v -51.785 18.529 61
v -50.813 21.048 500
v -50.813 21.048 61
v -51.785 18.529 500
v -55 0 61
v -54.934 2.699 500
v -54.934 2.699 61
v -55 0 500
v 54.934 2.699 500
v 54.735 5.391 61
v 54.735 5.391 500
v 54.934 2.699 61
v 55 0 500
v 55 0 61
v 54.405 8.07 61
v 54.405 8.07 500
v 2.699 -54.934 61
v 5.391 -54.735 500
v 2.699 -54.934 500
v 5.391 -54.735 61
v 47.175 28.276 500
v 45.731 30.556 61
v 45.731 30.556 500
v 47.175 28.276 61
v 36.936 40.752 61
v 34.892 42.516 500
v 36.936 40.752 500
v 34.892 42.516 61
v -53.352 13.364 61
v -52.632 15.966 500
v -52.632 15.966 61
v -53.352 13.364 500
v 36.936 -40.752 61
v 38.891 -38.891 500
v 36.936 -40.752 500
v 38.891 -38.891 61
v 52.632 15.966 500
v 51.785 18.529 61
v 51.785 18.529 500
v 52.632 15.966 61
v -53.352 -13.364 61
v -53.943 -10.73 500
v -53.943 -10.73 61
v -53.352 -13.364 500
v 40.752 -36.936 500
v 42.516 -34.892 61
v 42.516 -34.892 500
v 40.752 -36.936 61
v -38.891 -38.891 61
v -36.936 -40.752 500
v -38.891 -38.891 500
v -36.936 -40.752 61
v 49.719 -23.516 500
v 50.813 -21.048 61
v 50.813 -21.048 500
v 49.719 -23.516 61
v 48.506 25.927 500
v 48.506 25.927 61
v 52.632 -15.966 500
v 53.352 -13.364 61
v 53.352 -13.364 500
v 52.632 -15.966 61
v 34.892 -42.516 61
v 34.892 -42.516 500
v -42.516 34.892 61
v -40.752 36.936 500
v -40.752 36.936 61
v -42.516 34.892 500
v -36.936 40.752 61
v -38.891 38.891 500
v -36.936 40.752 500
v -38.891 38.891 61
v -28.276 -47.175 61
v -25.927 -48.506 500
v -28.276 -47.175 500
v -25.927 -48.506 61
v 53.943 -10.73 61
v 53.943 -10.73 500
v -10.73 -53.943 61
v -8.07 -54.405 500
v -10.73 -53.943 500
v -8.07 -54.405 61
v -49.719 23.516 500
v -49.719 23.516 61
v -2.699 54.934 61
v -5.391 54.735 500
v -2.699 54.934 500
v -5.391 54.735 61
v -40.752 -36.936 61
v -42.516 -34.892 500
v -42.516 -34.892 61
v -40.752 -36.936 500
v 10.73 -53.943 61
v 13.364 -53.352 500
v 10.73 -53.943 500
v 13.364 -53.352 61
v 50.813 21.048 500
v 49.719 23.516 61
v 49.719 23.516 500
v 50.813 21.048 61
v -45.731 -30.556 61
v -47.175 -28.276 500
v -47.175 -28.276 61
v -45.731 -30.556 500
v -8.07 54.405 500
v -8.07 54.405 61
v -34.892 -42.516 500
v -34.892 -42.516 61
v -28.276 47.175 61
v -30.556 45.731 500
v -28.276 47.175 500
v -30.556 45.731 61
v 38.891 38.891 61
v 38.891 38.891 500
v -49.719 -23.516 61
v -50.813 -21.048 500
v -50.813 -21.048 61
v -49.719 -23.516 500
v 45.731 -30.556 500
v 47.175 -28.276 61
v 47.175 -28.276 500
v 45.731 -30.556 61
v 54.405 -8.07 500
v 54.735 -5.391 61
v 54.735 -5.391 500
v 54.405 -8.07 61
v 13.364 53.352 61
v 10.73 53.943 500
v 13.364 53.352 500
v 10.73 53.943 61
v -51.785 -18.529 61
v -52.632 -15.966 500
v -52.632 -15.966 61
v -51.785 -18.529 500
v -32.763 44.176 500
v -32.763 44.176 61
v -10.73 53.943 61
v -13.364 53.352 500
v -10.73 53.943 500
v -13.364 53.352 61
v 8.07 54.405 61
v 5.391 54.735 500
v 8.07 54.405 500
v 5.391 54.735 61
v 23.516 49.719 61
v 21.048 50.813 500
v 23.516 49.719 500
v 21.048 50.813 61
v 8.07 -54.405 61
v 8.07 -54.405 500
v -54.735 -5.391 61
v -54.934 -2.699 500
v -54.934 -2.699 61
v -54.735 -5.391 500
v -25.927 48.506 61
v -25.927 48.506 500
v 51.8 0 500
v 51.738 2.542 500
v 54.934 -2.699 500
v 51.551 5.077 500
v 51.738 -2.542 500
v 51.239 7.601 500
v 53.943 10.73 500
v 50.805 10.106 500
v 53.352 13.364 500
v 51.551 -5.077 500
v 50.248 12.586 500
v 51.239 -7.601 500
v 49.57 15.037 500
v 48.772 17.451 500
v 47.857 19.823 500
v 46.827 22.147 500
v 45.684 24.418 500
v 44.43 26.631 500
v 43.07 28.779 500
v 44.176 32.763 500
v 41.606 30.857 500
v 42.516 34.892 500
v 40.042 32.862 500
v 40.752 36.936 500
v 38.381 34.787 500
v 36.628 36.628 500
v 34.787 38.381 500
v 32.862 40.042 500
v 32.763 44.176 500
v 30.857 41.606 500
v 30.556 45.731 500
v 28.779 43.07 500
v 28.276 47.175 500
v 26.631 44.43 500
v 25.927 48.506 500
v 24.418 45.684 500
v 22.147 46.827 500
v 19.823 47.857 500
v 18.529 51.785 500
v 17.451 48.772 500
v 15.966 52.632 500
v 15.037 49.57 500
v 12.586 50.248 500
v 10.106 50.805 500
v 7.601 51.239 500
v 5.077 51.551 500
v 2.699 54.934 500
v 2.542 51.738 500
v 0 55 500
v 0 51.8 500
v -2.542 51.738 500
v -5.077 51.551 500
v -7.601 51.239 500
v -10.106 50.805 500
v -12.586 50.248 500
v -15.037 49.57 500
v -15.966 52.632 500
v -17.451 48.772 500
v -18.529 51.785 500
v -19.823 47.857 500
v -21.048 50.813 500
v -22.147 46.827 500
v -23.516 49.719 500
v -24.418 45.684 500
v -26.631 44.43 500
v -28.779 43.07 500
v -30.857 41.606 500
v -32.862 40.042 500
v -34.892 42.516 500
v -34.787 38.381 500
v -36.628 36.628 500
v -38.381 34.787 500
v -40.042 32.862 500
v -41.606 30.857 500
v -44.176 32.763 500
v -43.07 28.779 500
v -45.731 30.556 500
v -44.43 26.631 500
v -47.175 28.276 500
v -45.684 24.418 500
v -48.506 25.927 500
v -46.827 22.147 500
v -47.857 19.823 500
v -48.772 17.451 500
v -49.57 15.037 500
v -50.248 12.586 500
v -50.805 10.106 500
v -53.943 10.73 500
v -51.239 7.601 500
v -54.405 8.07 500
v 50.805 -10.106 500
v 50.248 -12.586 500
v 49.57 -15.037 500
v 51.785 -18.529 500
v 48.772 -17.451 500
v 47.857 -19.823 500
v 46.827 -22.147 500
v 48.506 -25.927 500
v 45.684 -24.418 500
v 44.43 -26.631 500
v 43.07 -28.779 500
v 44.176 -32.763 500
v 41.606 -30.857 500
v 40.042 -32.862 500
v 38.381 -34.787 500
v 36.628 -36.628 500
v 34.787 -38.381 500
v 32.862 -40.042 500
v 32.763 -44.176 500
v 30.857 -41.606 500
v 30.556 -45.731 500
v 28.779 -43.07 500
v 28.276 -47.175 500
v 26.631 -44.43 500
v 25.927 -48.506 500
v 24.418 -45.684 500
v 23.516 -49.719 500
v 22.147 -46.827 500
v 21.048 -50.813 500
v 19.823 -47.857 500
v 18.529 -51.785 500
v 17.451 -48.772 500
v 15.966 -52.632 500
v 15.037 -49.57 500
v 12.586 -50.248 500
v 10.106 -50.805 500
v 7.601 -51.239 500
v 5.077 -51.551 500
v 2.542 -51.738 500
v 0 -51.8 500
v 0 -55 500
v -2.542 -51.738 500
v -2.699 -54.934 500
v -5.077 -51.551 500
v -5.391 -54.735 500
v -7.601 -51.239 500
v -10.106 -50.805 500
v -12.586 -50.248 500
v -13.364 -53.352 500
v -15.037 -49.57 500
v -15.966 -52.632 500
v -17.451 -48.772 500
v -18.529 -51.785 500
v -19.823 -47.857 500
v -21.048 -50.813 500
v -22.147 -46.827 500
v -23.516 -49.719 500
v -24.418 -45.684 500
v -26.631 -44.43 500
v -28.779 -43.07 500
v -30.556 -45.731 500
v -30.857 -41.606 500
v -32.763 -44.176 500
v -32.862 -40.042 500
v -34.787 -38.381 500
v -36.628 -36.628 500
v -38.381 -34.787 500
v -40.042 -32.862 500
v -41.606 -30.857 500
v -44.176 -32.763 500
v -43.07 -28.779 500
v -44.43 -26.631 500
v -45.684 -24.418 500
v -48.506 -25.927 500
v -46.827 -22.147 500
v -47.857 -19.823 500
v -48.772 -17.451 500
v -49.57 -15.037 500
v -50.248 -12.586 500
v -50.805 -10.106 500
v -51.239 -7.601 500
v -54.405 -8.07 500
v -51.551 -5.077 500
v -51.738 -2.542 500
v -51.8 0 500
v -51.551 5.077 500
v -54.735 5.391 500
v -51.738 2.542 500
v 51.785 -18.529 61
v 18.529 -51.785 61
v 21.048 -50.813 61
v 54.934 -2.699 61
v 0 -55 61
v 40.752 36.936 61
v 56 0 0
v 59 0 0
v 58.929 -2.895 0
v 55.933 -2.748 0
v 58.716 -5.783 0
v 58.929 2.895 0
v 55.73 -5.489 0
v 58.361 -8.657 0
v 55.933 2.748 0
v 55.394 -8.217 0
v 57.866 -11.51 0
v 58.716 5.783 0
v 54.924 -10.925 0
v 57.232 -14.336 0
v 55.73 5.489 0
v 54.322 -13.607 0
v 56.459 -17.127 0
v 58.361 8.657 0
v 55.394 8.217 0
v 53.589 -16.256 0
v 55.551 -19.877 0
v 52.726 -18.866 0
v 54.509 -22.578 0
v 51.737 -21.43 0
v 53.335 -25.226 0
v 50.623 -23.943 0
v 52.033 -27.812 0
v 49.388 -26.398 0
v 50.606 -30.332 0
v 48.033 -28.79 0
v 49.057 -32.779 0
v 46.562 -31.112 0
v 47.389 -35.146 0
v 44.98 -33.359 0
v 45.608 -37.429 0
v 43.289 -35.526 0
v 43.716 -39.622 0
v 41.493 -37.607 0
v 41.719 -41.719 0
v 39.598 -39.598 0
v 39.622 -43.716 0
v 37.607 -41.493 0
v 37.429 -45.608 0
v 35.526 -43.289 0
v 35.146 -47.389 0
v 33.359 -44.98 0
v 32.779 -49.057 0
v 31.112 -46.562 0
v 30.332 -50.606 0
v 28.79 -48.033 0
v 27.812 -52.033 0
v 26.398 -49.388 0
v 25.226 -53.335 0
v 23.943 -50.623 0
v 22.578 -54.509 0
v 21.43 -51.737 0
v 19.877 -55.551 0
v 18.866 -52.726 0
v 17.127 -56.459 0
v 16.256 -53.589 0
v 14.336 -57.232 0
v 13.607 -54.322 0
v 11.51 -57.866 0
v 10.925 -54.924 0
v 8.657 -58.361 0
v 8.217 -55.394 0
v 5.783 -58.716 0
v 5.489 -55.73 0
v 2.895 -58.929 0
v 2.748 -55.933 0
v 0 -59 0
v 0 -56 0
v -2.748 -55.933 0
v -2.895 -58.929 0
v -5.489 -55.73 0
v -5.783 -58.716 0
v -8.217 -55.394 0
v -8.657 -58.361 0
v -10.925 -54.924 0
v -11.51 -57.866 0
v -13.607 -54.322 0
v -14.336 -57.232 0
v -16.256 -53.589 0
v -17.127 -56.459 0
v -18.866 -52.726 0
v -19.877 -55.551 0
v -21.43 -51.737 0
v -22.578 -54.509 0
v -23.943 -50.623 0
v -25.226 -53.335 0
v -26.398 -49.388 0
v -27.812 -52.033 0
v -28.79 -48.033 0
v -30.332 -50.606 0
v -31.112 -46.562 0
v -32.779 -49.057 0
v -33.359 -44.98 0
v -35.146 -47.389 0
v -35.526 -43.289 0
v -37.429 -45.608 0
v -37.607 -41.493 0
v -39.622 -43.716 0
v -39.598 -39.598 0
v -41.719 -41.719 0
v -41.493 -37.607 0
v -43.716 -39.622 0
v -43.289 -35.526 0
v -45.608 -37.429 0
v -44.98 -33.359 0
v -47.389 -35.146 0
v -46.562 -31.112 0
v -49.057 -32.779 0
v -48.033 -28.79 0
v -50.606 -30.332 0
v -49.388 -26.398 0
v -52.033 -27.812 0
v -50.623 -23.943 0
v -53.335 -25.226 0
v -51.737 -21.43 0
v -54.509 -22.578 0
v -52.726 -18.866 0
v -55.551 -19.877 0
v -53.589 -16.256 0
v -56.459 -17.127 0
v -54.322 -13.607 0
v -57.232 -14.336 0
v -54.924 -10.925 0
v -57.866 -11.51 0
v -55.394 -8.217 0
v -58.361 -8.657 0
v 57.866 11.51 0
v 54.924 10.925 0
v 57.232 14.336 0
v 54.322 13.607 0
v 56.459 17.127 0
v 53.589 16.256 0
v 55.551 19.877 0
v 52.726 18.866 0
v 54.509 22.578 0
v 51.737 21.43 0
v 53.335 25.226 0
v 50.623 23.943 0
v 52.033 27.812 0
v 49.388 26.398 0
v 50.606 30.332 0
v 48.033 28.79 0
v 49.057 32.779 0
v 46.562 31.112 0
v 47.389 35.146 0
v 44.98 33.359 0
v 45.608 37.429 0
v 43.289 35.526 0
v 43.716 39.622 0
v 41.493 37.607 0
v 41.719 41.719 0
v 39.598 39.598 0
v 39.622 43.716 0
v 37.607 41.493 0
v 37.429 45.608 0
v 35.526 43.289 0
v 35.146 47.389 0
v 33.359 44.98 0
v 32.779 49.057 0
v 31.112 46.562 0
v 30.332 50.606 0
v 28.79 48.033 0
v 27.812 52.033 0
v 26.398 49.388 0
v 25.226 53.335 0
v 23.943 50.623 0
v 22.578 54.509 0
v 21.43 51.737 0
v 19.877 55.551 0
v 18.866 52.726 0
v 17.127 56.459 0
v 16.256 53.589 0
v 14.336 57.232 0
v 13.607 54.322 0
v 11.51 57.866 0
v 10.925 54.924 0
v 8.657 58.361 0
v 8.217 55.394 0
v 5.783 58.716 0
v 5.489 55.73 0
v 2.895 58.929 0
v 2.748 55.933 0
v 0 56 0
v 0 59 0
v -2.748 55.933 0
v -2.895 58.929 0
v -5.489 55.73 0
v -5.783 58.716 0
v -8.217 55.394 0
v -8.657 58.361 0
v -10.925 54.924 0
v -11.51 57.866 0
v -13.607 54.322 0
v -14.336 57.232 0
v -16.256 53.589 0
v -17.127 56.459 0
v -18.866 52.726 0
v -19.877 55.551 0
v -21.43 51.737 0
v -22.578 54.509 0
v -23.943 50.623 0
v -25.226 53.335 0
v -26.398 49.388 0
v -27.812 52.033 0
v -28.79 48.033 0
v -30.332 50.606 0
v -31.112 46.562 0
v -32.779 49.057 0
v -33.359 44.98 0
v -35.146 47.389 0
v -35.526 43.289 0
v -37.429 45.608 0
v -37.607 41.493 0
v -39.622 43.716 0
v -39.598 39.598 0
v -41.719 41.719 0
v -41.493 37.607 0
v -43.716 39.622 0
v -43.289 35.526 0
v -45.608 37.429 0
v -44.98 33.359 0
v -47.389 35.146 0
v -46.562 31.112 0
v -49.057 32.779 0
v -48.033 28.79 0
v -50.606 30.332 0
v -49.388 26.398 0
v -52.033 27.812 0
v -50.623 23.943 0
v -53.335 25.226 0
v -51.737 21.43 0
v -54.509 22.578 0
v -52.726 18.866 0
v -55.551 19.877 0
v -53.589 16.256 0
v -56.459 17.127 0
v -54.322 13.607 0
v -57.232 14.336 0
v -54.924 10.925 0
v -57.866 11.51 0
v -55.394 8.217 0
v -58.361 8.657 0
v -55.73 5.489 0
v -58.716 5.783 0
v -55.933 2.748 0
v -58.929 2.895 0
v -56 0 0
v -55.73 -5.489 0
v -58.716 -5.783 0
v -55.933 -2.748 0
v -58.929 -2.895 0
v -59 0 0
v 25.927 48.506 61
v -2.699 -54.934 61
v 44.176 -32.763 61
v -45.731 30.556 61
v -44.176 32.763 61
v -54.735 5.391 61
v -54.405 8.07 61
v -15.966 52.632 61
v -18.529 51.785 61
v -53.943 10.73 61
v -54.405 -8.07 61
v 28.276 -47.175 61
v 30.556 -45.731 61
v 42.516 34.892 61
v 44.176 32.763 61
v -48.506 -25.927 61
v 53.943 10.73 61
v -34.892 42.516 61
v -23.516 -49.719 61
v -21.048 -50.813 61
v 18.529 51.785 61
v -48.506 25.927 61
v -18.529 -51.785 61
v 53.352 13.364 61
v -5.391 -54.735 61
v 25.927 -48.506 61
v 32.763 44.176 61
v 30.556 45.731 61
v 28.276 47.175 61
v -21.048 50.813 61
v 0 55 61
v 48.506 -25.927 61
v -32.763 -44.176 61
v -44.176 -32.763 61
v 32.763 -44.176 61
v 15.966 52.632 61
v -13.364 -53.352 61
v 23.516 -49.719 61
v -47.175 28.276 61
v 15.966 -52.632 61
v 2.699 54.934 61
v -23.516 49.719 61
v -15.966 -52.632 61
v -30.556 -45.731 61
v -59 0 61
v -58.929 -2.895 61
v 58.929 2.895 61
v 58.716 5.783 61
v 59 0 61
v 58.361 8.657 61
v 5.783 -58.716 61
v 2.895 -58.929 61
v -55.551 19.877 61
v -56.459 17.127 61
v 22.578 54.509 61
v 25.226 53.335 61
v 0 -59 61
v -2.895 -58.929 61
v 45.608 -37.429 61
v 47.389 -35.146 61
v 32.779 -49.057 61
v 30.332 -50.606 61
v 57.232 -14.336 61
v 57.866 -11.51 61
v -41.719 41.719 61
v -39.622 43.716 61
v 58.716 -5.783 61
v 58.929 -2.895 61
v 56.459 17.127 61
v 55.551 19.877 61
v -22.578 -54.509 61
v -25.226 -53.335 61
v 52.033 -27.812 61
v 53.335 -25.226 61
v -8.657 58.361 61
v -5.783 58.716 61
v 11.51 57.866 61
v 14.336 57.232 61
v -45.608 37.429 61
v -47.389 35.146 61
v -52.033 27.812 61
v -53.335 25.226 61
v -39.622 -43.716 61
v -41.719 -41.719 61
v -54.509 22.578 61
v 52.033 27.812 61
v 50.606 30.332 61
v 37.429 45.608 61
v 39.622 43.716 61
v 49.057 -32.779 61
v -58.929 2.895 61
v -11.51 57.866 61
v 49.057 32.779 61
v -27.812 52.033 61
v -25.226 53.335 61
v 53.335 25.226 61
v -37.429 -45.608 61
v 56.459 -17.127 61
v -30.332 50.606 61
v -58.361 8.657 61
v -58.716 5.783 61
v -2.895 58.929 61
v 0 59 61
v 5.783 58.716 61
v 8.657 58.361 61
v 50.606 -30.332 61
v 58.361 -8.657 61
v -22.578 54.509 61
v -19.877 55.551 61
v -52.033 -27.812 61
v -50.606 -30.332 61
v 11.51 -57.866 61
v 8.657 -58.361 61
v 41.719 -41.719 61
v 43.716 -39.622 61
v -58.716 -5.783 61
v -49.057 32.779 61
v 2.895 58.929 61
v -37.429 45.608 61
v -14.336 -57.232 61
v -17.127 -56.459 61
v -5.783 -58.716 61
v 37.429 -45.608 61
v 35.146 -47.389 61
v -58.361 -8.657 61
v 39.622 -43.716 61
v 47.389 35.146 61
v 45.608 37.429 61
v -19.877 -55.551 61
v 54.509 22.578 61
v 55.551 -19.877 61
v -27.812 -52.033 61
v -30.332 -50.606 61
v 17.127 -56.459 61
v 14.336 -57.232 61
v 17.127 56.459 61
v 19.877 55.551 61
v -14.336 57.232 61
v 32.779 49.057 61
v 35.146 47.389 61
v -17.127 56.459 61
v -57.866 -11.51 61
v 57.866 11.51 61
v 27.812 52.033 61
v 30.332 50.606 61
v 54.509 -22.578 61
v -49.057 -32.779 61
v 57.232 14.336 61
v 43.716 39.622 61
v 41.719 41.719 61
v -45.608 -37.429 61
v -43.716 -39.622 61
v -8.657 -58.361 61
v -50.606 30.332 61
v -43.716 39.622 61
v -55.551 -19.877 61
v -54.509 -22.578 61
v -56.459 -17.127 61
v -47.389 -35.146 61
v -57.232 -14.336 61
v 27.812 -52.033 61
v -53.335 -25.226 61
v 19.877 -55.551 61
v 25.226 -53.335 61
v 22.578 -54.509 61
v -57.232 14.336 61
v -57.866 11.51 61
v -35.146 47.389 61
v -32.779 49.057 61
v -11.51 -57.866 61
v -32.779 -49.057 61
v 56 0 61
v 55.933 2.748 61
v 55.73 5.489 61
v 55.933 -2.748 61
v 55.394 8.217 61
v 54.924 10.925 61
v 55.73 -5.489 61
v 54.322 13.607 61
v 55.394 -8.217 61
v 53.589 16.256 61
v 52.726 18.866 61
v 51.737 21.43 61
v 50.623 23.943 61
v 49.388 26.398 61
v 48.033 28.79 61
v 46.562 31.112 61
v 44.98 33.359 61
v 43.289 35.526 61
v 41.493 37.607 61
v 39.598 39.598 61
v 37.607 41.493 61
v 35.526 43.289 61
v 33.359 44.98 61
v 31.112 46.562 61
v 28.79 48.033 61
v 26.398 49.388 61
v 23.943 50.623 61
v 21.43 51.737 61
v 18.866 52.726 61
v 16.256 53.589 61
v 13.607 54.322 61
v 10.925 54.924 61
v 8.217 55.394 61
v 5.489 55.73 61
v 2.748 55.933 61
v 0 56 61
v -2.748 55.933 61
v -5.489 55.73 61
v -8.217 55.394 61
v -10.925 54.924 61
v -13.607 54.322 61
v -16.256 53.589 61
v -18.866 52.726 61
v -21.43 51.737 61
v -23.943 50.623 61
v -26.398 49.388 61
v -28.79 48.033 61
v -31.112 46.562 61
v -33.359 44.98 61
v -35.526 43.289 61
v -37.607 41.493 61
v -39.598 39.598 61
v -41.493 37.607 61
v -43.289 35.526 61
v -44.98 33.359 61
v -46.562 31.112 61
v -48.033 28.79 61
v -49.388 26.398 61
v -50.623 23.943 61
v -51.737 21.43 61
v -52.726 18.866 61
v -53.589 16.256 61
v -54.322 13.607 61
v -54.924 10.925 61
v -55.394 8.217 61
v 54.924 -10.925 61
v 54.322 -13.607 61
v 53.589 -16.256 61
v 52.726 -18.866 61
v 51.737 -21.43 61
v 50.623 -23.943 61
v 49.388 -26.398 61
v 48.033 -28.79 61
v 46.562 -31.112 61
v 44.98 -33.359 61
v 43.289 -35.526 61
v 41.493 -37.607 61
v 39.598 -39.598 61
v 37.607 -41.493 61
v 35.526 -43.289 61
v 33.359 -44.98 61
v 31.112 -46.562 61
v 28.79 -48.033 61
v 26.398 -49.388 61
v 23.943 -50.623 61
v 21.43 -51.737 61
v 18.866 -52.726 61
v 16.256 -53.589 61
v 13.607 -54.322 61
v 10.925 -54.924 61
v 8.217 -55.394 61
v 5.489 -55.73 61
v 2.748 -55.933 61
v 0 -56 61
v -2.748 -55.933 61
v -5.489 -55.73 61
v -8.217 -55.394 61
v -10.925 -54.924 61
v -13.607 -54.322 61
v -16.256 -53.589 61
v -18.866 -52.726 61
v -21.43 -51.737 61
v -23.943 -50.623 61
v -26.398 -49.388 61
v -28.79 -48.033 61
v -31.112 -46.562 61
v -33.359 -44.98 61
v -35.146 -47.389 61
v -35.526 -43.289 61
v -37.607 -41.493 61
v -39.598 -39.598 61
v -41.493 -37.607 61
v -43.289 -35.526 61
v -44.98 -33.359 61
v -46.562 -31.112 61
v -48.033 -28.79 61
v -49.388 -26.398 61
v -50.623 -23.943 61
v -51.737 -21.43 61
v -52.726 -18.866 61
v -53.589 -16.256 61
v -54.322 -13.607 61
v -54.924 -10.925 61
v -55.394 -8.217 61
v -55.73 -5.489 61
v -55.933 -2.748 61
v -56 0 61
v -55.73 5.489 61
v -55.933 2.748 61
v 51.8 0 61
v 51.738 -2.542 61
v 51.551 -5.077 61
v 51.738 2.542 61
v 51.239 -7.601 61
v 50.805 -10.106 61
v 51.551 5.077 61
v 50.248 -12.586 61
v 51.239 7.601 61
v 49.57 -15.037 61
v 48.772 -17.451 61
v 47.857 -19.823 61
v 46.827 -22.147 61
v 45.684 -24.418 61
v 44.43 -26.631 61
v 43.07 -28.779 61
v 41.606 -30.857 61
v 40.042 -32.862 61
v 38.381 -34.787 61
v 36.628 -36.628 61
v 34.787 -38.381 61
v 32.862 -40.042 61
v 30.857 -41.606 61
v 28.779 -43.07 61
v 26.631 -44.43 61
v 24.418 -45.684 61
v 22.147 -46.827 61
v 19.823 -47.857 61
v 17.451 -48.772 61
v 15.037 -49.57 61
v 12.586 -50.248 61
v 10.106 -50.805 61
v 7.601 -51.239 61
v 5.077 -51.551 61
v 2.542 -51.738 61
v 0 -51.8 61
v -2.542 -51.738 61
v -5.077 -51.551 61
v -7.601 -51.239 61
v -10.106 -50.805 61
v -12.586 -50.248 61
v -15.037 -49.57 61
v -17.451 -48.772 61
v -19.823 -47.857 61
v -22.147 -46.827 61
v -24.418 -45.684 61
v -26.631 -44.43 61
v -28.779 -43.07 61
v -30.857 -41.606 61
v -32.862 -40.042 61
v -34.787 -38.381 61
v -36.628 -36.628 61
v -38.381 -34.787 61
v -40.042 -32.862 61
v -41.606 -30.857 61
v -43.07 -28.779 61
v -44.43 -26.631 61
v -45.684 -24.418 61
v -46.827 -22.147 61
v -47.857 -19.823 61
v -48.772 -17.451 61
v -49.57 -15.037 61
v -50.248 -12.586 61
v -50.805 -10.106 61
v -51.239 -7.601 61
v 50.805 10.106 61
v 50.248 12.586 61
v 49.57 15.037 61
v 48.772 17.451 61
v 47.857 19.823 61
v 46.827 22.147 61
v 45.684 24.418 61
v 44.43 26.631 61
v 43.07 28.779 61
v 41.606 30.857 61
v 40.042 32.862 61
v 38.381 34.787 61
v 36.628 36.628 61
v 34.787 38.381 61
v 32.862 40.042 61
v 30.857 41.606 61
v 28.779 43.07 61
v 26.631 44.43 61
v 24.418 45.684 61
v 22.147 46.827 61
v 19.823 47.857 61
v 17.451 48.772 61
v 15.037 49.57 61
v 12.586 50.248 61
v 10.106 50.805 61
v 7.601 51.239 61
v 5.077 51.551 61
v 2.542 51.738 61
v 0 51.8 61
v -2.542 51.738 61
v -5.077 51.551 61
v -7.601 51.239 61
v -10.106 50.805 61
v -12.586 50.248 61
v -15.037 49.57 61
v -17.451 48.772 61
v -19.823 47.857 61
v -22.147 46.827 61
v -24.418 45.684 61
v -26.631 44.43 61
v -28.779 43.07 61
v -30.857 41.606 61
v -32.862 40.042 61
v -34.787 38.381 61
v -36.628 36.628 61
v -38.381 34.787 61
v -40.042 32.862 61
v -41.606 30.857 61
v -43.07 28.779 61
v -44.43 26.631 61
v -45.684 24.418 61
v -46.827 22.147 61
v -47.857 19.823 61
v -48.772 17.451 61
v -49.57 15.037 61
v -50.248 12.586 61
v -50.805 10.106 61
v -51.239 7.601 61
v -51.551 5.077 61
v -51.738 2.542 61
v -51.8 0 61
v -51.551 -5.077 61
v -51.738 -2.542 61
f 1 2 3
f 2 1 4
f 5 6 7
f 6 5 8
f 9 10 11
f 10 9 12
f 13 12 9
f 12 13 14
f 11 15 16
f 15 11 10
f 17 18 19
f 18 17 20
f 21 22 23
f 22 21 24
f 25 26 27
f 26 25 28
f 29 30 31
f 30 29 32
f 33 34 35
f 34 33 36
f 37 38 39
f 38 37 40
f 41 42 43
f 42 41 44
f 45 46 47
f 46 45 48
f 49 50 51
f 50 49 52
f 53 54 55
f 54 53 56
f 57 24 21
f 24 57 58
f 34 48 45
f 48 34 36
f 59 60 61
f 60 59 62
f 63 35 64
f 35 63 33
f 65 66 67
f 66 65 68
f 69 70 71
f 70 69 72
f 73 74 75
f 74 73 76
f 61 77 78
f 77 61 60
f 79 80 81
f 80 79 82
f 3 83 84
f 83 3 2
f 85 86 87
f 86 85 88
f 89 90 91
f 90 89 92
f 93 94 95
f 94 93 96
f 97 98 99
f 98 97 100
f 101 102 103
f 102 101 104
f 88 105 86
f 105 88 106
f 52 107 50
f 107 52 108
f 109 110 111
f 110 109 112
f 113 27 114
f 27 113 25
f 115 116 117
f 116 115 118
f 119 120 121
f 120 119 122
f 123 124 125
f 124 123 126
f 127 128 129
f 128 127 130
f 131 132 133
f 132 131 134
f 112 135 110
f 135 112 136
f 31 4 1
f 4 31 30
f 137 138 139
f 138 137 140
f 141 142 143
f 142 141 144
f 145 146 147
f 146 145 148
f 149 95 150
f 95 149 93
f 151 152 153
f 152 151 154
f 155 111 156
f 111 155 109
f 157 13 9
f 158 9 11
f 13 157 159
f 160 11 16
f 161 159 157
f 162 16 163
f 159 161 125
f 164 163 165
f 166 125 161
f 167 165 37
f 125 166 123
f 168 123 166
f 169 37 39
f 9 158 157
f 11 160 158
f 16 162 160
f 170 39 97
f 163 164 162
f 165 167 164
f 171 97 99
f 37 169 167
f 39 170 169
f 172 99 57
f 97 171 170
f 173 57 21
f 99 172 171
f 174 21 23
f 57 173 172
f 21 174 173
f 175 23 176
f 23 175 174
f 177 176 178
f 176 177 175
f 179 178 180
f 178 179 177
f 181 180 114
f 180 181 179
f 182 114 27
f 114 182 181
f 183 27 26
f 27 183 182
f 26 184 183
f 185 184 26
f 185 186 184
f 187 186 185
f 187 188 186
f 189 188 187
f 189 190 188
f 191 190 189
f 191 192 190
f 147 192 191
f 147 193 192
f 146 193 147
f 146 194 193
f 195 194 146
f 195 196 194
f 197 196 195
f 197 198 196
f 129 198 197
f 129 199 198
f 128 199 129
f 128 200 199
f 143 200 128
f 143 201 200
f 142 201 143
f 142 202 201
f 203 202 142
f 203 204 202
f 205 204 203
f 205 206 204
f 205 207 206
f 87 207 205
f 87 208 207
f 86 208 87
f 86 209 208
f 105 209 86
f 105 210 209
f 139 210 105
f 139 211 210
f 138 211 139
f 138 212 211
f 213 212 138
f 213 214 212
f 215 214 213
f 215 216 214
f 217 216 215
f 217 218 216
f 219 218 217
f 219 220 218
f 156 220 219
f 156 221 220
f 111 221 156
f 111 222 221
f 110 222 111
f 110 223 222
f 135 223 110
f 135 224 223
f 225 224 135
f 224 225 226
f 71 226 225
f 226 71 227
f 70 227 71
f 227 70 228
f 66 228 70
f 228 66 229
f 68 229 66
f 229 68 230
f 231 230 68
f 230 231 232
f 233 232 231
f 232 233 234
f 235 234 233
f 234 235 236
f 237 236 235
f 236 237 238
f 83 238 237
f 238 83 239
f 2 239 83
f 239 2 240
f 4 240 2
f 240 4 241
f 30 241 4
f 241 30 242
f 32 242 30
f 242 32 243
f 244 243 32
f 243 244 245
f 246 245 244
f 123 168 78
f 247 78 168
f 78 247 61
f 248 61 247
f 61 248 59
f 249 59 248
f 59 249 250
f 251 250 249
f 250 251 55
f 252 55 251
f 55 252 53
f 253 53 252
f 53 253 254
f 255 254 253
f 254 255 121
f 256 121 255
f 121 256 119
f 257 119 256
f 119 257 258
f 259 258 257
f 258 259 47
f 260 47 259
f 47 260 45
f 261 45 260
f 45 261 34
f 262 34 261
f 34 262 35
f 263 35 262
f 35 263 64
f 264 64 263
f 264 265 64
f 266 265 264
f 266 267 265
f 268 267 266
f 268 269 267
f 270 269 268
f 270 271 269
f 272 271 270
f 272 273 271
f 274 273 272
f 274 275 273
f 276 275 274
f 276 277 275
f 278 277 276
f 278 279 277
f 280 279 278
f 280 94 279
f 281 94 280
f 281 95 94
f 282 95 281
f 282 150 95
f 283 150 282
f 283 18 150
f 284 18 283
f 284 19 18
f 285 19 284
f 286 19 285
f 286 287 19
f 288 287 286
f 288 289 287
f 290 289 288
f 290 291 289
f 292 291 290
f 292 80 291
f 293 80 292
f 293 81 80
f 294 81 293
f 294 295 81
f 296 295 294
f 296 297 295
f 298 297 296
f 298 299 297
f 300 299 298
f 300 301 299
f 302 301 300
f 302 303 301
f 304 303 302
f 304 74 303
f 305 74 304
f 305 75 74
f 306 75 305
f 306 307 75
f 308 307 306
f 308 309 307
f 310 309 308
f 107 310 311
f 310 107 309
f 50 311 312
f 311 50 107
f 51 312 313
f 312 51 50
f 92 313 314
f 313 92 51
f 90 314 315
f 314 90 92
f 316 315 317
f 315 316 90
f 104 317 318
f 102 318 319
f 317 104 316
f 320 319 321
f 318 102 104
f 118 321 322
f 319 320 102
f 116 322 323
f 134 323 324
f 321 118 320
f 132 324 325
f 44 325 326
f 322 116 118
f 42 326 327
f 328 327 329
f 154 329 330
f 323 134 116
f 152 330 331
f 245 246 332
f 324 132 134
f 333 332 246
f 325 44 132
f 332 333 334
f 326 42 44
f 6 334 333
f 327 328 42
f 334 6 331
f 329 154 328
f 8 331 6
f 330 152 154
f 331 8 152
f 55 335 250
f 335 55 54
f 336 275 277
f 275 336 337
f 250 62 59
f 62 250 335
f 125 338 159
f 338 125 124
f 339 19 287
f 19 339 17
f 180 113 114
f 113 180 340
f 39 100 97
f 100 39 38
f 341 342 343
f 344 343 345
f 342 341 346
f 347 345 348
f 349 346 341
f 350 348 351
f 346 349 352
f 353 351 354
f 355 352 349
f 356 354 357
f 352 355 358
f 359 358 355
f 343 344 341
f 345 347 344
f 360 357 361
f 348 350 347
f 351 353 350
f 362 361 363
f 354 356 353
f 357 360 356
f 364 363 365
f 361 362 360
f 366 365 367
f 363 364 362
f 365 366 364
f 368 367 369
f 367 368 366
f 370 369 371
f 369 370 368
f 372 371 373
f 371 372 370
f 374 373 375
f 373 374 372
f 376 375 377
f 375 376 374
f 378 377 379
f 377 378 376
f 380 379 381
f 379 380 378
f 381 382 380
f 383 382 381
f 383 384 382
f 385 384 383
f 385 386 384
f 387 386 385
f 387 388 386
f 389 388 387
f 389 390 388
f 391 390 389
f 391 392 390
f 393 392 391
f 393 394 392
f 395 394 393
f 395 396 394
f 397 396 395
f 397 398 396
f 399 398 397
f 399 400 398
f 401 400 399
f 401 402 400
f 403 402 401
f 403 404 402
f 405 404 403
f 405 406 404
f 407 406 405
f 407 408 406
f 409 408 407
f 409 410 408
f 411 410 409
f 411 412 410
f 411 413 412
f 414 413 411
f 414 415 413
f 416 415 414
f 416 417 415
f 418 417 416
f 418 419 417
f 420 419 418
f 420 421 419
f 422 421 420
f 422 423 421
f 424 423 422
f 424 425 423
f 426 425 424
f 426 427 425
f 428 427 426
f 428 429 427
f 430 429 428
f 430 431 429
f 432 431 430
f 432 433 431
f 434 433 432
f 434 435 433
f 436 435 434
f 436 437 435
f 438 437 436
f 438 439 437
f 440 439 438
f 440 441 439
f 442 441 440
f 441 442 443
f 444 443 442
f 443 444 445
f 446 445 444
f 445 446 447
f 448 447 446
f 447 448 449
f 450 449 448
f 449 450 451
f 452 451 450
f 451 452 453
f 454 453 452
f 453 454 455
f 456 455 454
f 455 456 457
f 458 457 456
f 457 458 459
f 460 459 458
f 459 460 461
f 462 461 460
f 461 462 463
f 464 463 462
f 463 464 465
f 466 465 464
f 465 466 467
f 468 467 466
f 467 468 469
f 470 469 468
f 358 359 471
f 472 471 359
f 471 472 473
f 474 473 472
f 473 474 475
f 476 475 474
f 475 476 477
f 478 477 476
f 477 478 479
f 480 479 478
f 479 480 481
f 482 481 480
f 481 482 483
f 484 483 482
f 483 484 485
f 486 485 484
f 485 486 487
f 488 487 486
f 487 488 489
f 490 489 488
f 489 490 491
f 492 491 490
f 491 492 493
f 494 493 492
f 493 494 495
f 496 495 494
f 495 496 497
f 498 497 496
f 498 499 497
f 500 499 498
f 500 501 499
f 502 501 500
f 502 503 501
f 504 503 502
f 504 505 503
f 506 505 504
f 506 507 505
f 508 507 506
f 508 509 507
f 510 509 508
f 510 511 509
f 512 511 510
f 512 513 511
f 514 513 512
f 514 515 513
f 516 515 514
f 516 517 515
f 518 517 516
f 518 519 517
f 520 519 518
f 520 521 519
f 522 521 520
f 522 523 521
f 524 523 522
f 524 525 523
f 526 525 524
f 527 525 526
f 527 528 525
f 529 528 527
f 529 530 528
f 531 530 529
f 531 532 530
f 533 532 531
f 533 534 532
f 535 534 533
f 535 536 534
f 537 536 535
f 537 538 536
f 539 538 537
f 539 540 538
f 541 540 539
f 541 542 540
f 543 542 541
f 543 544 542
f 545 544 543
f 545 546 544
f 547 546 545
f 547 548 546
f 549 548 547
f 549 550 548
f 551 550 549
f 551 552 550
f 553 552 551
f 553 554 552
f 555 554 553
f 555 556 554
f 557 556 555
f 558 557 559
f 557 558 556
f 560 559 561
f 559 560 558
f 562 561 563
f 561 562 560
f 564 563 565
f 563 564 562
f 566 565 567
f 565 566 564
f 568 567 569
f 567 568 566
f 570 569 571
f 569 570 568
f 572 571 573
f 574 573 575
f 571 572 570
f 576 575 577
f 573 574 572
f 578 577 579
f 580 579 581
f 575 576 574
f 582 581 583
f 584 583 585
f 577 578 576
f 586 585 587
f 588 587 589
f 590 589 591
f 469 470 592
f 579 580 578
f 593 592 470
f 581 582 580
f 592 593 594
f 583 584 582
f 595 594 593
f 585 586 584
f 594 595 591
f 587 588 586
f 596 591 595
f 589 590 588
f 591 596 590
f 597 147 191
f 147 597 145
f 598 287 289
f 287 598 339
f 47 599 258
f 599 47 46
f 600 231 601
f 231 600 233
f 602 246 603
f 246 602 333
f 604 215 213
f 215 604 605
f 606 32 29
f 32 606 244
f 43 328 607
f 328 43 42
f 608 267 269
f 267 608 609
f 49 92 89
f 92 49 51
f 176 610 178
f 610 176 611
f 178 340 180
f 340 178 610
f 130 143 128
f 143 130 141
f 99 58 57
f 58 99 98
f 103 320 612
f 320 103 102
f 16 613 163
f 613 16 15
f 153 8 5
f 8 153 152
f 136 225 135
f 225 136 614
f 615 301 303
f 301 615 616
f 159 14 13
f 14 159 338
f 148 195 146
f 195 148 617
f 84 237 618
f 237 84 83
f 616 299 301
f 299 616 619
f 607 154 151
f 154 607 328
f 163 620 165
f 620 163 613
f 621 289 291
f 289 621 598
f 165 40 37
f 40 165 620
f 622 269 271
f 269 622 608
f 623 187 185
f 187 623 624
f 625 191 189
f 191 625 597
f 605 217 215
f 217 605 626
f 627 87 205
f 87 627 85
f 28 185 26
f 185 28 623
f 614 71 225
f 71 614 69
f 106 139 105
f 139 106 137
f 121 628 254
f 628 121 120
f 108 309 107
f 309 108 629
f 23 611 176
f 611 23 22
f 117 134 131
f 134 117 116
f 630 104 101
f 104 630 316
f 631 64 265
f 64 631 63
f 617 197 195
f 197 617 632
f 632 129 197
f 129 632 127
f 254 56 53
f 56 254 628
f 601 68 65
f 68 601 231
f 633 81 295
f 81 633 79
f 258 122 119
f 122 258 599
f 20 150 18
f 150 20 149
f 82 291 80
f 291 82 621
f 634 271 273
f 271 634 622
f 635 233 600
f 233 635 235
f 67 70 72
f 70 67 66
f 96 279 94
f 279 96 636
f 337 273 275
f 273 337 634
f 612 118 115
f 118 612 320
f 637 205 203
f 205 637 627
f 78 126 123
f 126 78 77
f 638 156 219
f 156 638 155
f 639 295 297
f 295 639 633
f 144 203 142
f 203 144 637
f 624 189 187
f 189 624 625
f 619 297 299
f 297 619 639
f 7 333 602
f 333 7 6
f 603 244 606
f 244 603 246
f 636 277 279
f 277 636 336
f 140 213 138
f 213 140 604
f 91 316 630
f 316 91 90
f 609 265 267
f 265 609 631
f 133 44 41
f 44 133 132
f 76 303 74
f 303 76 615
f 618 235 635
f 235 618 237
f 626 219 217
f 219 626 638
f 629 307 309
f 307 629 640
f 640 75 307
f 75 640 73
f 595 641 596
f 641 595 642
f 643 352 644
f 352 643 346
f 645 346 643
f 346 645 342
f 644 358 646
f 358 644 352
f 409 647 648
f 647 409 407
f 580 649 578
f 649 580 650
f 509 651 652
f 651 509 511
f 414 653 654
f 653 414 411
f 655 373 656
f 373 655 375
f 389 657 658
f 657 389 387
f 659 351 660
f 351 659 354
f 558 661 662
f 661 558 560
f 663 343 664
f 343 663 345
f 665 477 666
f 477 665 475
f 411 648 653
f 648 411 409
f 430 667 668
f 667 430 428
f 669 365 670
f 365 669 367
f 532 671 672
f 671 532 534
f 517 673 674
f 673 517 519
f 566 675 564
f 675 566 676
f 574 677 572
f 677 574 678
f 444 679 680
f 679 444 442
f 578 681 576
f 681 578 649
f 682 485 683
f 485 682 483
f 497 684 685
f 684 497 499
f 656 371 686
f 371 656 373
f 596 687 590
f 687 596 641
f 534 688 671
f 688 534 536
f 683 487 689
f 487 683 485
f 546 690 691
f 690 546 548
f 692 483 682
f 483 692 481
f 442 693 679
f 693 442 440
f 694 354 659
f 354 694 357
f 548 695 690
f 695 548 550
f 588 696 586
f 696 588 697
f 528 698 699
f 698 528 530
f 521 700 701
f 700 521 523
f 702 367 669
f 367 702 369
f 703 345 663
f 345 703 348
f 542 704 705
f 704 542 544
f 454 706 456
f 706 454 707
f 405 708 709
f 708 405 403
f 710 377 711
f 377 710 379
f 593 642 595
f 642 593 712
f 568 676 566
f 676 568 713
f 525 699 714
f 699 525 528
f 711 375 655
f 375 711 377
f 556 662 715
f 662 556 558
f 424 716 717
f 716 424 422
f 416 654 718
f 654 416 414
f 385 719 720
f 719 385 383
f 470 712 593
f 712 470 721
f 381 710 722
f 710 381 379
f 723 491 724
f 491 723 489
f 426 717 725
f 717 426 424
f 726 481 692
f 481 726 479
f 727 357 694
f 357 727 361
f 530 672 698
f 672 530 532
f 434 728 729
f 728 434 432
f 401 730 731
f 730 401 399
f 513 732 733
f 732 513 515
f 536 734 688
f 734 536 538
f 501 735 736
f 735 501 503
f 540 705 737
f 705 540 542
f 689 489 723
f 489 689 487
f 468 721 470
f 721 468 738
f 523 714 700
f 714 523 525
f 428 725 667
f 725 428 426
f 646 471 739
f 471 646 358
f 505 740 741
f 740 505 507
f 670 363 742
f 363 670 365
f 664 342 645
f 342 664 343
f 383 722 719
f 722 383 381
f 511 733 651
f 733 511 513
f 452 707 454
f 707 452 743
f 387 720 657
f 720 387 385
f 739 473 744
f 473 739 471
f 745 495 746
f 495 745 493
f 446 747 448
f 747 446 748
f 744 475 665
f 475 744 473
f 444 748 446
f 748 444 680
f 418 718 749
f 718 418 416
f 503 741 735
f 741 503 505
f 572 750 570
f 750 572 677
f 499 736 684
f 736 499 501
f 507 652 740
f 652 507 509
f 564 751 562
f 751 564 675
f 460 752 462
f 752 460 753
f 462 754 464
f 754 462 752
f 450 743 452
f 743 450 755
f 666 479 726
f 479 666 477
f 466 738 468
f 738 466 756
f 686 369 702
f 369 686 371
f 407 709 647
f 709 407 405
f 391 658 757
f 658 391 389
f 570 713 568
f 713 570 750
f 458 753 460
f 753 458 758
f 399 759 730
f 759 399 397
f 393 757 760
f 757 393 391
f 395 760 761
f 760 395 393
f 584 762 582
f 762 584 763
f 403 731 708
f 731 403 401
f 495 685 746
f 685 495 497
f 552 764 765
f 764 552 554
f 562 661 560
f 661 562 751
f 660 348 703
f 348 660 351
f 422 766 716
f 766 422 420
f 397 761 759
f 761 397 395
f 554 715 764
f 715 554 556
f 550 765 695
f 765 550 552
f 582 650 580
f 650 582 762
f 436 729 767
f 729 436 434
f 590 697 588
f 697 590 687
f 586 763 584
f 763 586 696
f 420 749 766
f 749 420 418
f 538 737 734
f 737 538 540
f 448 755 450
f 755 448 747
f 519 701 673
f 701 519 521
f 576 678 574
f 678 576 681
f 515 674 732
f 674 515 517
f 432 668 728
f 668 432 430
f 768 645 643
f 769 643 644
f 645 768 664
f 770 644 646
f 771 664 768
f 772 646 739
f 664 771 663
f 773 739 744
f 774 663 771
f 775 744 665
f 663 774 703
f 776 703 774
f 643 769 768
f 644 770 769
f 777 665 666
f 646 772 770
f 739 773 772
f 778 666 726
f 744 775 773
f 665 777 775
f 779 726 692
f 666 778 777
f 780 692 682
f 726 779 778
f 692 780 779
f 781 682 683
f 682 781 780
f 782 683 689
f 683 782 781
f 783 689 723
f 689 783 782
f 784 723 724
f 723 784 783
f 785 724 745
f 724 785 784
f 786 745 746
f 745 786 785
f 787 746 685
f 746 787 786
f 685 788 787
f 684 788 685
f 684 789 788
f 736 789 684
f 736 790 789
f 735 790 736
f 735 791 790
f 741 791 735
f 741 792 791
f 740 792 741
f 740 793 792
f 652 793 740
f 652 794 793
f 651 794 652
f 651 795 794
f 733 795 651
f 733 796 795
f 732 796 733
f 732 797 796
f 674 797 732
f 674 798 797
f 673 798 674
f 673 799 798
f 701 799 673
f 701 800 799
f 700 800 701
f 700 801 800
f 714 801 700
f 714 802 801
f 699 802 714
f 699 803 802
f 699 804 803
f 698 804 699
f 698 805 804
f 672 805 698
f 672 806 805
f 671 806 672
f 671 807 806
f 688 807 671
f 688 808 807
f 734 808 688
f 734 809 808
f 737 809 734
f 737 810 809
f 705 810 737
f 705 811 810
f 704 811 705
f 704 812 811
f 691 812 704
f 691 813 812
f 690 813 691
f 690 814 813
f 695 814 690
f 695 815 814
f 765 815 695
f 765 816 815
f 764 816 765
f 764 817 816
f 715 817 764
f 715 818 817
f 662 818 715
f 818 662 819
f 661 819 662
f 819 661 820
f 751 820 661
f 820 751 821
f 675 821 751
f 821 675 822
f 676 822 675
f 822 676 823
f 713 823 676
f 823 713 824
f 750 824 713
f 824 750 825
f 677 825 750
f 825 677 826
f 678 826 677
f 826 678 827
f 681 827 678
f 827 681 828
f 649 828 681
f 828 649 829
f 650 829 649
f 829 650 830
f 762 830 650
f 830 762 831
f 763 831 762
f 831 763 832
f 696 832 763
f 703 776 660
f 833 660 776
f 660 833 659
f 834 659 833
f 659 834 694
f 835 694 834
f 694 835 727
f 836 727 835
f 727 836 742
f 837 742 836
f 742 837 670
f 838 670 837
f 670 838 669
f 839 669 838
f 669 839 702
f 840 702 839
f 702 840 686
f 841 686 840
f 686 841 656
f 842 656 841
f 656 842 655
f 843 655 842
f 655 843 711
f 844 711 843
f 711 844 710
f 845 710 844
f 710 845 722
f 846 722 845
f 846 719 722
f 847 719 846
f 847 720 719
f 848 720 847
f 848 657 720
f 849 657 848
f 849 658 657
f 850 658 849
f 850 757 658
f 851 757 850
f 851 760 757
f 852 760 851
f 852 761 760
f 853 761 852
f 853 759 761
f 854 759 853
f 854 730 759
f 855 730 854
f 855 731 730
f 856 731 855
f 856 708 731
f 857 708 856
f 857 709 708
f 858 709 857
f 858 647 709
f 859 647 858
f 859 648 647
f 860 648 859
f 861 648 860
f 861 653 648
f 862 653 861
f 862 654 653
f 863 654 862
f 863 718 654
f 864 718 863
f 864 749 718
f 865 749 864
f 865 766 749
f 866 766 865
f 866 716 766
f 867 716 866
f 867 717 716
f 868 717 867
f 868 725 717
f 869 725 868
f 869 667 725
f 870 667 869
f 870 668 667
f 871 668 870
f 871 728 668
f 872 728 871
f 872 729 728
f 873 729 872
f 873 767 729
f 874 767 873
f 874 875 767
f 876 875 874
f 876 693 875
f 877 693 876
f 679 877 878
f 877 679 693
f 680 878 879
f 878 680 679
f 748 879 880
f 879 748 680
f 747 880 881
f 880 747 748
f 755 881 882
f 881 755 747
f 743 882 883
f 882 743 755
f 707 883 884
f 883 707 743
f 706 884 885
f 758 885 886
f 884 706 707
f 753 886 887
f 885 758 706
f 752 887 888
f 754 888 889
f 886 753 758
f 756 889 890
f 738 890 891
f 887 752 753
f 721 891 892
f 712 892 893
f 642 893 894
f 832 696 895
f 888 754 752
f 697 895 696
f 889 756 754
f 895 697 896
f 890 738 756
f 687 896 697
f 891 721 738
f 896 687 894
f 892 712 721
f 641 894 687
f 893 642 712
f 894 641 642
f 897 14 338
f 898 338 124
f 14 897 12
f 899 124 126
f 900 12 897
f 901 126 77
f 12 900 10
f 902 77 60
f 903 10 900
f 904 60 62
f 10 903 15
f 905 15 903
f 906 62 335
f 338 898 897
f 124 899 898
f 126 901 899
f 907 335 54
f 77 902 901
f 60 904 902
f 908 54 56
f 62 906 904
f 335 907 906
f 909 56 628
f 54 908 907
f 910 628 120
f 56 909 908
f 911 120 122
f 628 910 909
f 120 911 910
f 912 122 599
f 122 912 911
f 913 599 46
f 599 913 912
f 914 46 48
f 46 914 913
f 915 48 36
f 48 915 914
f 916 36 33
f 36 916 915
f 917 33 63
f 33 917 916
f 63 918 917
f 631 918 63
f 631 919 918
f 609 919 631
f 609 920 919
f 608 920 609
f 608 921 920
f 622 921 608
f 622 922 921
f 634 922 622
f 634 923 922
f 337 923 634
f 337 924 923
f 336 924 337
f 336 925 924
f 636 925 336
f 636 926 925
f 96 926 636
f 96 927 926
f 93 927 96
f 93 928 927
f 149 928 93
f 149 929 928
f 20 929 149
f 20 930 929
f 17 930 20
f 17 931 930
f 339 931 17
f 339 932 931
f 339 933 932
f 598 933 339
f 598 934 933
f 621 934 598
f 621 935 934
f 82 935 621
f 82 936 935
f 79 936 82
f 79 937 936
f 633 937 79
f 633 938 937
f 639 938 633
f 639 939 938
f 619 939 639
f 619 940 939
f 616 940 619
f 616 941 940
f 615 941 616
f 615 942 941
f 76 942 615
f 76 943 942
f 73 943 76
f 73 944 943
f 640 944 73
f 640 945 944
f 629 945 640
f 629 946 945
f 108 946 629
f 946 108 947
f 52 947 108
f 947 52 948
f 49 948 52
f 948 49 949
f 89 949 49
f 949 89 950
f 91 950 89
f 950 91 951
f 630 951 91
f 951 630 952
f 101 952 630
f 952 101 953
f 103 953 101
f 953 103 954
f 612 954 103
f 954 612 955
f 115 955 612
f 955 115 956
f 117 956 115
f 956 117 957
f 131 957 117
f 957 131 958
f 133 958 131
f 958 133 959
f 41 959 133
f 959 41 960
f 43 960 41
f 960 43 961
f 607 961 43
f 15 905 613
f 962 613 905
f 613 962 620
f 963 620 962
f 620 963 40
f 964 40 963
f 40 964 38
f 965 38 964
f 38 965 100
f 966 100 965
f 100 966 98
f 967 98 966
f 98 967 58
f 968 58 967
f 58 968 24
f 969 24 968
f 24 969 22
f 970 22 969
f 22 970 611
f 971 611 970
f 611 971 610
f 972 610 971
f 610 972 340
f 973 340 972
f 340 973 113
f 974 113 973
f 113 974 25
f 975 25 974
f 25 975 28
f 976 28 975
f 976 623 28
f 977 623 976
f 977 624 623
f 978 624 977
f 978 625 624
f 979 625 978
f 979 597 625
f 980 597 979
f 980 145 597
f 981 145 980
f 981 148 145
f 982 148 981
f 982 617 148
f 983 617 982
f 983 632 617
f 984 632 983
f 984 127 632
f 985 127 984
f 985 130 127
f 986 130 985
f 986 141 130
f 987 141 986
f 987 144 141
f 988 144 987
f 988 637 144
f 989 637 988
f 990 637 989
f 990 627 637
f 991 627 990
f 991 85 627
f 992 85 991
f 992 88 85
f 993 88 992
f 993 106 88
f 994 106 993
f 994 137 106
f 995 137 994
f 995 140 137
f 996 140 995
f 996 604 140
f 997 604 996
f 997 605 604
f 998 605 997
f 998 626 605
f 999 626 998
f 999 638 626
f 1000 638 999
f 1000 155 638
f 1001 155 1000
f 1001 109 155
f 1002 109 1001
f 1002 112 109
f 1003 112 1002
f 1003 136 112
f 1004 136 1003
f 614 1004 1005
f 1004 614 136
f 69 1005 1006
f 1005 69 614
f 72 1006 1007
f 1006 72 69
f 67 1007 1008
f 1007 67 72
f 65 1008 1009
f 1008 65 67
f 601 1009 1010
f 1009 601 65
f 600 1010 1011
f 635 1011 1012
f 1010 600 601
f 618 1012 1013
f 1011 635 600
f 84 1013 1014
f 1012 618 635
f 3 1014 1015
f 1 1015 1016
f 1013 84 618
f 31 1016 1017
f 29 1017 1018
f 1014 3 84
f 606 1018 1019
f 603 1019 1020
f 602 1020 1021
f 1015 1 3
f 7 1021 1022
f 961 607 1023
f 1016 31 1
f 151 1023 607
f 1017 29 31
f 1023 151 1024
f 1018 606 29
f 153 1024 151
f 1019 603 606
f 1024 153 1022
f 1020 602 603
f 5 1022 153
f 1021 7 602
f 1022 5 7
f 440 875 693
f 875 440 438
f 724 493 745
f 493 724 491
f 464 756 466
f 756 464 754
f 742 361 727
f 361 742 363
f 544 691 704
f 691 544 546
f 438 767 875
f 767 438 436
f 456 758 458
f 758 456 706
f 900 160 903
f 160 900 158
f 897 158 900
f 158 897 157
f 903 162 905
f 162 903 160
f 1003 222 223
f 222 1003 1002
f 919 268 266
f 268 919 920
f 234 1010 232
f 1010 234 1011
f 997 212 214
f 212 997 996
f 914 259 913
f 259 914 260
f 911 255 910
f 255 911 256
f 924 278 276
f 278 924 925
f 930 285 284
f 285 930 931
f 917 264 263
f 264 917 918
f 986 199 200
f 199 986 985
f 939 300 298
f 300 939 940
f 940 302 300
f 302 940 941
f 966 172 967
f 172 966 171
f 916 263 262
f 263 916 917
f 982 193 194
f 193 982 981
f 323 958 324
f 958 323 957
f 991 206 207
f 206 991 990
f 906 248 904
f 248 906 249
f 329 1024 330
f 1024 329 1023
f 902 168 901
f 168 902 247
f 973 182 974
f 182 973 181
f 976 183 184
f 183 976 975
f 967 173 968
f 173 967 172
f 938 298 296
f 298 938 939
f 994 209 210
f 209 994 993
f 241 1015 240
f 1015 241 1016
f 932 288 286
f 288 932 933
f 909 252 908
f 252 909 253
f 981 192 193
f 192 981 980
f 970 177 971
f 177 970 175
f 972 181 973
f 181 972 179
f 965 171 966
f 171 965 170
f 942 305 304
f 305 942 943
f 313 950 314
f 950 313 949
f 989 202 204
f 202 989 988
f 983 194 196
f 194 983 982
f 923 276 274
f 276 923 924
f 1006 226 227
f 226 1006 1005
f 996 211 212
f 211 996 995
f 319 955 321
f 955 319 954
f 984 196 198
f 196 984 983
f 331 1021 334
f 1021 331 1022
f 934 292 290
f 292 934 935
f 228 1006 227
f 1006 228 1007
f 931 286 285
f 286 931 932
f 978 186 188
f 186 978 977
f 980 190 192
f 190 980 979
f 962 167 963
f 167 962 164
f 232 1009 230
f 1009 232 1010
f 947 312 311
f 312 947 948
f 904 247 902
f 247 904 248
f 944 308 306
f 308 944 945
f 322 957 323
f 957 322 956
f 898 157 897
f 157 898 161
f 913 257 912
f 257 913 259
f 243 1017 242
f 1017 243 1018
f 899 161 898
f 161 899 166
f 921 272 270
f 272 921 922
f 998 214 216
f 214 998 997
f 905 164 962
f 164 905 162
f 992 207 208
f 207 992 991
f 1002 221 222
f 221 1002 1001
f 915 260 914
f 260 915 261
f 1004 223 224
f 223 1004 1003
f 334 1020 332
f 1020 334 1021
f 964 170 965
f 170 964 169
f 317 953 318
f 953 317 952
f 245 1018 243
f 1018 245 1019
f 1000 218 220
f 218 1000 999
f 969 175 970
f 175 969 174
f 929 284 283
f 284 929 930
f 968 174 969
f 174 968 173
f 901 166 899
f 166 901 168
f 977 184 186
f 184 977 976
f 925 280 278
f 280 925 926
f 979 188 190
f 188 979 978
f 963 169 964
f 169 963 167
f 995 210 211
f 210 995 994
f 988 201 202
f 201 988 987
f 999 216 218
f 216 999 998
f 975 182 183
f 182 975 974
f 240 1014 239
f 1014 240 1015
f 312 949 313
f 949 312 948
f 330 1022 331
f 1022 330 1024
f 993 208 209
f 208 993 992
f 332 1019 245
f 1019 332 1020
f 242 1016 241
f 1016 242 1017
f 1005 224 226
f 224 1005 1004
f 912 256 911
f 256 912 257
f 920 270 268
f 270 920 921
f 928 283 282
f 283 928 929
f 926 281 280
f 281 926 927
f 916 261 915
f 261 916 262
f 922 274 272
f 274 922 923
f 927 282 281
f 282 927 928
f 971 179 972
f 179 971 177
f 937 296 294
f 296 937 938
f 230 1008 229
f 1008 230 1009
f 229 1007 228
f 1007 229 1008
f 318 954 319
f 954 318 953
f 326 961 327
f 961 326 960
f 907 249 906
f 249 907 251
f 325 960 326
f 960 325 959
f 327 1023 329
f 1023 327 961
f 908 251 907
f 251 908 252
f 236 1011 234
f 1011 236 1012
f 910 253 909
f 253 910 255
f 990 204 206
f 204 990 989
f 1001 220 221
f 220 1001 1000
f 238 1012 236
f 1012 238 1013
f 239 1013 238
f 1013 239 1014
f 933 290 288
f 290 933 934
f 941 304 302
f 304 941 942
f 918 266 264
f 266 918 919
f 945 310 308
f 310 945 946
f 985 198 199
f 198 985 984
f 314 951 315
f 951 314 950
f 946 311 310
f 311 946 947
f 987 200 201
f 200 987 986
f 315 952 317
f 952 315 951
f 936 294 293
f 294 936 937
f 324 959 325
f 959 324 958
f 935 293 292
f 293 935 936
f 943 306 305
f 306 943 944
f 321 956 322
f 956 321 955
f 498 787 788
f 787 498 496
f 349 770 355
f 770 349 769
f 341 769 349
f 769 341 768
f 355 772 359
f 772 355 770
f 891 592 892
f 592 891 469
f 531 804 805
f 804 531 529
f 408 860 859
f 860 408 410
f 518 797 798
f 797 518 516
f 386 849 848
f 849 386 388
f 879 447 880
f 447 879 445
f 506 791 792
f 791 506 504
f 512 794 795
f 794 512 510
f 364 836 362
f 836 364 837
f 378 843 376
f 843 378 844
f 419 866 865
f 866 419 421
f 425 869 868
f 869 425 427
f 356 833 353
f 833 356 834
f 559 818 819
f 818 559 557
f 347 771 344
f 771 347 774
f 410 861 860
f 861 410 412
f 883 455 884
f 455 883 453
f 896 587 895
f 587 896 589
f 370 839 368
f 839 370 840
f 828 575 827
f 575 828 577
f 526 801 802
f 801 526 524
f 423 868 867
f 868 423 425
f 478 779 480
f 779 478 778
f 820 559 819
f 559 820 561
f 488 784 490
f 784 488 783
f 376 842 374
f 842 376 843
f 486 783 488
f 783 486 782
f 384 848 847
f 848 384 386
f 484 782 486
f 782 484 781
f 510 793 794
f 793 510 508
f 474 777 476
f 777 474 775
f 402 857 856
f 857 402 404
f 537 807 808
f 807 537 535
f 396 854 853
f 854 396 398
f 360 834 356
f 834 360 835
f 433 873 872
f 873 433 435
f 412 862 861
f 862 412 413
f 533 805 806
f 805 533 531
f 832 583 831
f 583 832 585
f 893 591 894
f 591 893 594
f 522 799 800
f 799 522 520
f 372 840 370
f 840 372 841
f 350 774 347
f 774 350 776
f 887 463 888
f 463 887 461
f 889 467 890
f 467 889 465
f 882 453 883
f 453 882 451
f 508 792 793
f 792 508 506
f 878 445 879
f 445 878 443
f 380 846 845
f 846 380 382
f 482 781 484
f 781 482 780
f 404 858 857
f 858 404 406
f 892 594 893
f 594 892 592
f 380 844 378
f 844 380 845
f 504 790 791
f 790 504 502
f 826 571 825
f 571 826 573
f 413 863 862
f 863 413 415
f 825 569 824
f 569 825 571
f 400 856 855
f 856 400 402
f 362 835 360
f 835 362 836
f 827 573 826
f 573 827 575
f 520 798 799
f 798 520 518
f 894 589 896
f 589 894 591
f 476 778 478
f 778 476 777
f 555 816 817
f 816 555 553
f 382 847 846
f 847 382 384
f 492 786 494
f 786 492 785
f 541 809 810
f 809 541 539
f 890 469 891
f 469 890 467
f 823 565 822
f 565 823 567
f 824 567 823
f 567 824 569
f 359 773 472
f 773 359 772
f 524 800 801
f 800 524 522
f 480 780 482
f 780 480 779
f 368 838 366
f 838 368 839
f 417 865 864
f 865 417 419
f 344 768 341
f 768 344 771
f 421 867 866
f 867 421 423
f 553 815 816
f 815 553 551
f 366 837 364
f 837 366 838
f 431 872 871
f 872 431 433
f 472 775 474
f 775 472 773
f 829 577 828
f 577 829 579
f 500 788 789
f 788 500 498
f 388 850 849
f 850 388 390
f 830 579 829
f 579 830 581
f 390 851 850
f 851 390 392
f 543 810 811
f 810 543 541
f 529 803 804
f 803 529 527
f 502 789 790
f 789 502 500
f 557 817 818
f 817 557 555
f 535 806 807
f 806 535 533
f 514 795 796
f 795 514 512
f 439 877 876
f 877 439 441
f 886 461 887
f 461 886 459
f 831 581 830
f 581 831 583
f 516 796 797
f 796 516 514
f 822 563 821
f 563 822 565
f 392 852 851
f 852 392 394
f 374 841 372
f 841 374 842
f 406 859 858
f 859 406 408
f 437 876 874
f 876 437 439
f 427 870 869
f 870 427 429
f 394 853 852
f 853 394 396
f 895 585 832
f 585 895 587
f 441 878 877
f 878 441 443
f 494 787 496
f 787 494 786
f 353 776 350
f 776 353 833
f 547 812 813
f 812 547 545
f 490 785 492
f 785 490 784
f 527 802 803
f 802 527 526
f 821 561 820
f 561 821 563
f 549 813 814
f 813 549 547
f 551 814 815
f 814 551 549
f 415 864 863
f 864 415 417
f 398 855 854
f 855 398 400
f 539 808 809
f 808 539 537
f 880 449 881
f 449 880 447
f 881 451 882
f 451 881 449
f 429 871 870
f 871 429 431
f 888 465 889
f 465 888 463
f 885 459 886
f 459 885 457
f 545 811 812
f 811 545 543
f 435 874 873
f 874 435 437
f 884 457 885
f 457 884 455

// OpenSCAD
// Parameters
nominal_diameter_mm = 110; //[55:220:1]
length_mm = 500; //[250:1000:1]
wall_thickness_mm = 3.2; //[1.6:6.4:0.1]
fitting_length_mm = 60; //[30:120:1]
fitting_radial_thickness_mm = 4; //[2:10:0.5]
fitting_inner_clearance_mm = 1; //[0.2:3:0.1]
overlap_mm = 1; //[0.5:2:0.1]

$fn = 128;

module ht_pipe() {
  od_r = nominal_diameter_mm/2;
  id_r = od_r - wall_thickness_mm;

  // Socket (outer sleeve) radii
  fit_od_r = od_r + fitting_radial_thickness_mm;
  fit_id_r = od_r + fitting_inner_clearance_mm;

  // Safety clamps to avoid invalid/empty geometry
  id_r_safe     = max(0.01, id_r);
  fit_id_r_safe = max(0.01, fit_id_r);

  // Ensure the socket cavity is not larger than the socket outer radius
  fit_id_r_clamped = min(fit_id_r_safe, fit_od_r - 0.01);

  // Ensure the socket cavity is not smaller than the main OD (otherwise no socket clearance)
  fit_id_r_final = max(fit_id_r_clamped, od_r + 0.01);

  // Place socket at the BOTTOM end (z=0) so it is visible in typical views
  color([0.85, 0.85, 0.8])
  difference() {
    // OUTER solid: pipe + socket, connected (overlap by overlap_mm)
    union() {
      cylinder(h=length_mm, r=od_r, center=false);

      translate([0, 0, 0])
        cylinder(h=fitting_length_mm + overlap_mm, r=fit_od_r, center=false);
    }

    // INNER voids: main bore + socket cavity, with overlaps to avoid coincident faces
    union() {
      // Main bore through entire length
      translate([0, 0, -overlap_mm])
        cylinder(h=length_mm + 2*overlap_mm, r=id_r_safe, center=false);

      // Socket cavity from bottom end upward
      translate([0, 0, -overlap_mm])
        cylinder(h=fitting_length_mm + 2*overlap_mm, r=fit_id_r_final, center=false);
    }
  }
}

ht_pipe();
